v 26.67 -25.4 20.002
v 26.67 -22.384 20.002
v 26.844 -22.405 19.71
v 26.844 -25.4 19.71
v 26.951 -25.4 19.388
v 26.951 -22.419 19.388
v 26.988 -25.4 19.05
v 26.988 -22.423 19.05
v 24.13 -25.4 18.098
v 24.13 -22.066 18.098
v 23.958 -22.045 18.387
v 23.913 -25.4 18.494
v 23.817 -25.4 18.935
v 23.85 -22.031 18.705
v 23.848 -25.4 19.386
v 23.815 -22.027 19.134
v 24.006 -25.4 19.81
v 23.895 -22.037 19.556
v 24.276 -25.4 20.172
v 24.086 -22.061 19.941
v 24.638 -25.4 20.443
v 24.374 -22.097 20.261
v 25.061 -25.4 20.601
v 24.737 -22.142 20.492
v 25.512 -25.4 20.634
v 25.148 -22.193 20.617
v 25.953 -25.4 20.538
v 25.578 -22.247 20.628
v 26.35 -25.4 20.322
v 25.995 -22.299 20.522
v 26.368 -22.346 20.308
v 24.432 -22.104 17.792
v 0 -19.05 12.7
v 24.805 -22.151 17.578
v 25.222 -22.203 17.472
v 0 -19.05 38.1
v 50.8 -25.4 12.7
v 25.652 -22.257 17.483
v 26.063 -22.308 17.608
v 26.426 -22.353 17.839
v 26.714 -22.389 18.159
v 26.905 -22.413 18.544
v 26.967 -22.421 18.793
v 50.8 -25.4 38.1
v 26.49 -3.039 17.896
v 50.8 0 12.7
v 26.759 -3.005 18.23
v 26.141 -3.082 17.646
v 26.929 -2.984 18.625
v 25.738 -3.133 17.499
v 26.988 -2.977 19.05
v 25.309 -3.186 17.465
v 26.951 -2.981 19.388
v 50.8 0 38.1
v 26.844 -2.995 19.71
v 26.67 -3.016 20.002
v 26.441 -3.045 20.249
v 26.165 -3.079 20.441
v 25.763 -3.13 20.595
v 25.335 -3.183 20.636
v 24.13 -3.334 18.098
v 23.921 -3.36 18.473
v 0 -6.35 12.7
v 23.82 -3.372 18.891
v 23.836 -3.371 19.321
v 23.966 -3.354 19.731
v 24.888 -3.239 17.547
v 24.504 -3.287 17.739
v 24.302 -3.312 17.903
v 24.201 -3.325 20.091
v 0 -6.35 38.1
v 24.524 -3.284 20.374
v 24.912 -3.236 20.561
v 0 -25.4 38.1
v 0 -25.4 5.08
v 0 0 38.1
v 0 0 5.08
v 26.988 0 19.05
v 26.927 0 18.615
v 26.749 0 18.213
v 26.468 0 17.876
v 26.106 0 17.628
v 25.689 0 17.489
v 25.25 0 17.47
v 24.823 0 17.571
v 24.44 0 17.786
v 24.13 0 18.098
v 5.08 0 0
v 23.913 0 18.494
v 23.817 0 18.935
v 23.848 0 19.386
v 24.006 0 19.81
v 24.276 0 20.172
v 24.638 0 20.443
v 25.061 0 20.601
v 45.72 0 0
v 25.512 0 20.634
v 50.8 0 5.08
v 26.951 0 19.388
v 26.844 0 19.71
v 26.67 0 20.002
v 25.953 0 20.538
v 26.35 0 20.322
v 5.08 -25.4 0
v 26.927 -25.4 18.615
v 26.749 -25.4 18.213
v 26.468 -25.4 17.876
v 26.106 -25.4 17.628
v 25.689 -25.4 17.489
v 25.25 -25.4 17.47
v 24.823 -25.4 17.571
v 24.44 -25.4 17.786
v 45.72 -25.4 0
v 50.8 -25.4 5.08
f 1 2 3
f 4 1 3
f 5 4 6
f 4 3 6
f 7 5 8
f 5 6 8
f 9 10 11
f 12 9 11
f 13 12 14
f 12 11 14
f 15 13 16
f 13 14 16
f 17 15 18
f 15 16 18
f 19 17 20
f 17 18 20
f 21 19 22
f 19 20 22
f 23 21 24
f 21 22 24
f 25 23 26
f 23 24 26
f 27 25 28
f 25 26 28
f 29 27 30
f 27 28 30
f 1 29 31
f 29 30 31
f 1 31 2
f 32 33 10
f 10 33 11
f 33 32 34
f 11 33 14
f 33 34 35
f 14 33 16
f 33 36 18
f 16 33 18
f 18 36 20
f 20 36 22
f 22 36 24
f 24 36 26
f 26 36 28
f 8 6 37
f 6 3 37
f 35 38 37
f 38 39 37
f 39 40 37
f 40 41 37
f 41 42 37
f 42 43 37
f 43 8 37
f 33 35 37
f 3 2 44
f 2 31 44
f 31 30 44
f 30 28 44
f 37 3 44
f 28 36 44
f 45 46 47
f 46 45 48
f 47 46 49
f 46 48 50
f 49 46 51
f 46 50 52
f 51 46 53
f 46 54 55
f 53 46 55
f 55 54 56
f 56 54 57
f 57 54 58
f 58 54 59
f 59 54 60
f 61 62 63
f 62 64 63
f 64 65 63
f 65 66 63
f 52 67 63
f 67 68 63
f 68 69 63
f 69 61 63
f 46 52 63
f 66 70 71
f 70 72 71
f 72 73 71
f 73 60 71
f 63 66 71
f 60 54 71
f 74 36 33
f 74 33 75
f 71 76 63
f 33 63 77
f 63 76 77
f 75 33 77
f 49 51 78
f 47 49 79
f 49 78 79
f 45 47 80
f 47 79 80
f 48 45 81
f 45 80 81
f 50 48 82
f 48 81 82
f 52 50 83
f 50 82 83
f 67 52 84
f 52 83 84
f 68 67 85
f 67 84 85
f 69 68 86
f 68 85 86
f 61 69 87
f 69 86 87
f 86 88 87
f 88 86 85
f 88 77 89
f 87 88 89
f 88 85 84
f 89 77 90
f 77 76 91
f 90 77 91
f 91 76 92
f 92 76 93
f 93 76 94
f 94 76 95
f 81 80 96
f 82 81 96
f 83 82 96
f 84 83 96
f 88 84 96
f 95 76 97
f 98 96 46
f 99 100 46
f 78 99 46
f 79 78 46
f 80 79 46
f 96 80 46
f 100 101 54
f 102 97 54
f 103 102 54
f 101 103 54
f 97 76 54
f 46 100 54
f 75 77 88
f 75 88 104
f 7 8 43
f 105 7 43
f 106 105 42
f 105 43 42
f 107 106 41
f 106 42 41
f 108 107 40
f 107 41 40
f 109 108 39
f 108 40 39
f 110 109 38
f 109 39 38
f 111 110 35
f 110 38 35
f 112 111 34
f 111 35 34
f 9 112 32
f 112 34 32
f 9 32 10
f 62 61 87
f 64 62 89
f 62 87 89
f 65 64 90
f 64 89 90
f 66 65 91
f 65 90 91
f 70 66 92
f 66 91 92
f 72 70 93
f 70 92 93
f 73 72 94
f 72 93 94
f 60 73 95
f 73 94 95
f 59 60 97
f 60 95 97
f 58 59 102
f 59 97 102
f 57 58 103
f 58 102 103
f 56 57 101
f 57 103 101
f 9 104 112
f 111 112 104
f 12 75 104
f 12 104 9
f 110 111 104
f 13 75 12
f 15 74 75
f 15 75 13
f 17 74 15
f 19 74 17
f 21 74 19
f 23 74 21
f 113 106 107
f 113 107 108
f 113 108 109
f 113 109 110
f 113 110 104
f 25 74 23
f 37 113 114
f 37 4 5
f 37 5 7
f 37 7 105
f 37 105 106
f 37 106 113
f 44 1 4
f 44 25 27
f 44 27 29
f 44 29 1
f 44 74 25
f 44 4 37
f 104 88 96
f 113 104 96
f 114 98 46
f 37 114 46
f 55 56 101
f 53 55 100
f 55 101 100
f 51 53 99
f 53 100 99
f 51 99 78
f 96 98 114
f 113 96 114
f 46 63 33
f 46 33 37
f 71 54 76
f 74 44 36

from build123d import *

# Parameters (mm, degrees)
F1_DEPTH = 25.4
F3_DEPTH = 25.4
F4_SIZE  = 5.08


with BuildPart() as f1:
    # F0 (on Front) → F1 (new body)
    with BuildSketch(Plane.XZ):
        with BuildLine():
            Line((24.13, 18.0975), (0, 0))
            Line((0, 0), (50.8, 0))
            Line((50.8, 0), (50.8, 38.1))
            Line((50.8, 38.1), (26.67, 20.0025))
            ThreePointArc((26.67, 20.0025), (26.906035, 19.552012), (26.9875, 19.05))
            ThreePointArc((26.9875, 19.05), (25.902012, 17.543965), (24.13, 18.0975))
        make_face()
        with BuildLine():
            Line((0, 38.1), (0, 0))
            Line((0, 0), (24.13, 18.0975))
            ThreePointArc((24.13, 18.0975), (24.4475, 20.32), (26.67, 20.0025))
            Line((26.67, 20.0025), (50.8, 38.1))
            Line((50.8, 38.1), (0, 38.1))
        make_face()
    extrude(amount=F1_DEPTH)

    # F2 (on face) → F3 (cut)
    with BuildSketch(Plane.XY.offset(38.1)):
        Polygon((0, -6.35), (0, -19.05), (50.8, -25.4), (50.8, 0), align=None)
    extrude(amount=-F3_DEPTH, mode=Mode.SUBTRACT)

    # F4
    f4_edges = [f1.edges().sort_by_distance(p)[0] for p in [
        (50.8, -12.7, 0),
        (0, -12.7, 0),
    ]]
    chamfer(f4_edges, length=F4_SIZE)


solid = f1.part
